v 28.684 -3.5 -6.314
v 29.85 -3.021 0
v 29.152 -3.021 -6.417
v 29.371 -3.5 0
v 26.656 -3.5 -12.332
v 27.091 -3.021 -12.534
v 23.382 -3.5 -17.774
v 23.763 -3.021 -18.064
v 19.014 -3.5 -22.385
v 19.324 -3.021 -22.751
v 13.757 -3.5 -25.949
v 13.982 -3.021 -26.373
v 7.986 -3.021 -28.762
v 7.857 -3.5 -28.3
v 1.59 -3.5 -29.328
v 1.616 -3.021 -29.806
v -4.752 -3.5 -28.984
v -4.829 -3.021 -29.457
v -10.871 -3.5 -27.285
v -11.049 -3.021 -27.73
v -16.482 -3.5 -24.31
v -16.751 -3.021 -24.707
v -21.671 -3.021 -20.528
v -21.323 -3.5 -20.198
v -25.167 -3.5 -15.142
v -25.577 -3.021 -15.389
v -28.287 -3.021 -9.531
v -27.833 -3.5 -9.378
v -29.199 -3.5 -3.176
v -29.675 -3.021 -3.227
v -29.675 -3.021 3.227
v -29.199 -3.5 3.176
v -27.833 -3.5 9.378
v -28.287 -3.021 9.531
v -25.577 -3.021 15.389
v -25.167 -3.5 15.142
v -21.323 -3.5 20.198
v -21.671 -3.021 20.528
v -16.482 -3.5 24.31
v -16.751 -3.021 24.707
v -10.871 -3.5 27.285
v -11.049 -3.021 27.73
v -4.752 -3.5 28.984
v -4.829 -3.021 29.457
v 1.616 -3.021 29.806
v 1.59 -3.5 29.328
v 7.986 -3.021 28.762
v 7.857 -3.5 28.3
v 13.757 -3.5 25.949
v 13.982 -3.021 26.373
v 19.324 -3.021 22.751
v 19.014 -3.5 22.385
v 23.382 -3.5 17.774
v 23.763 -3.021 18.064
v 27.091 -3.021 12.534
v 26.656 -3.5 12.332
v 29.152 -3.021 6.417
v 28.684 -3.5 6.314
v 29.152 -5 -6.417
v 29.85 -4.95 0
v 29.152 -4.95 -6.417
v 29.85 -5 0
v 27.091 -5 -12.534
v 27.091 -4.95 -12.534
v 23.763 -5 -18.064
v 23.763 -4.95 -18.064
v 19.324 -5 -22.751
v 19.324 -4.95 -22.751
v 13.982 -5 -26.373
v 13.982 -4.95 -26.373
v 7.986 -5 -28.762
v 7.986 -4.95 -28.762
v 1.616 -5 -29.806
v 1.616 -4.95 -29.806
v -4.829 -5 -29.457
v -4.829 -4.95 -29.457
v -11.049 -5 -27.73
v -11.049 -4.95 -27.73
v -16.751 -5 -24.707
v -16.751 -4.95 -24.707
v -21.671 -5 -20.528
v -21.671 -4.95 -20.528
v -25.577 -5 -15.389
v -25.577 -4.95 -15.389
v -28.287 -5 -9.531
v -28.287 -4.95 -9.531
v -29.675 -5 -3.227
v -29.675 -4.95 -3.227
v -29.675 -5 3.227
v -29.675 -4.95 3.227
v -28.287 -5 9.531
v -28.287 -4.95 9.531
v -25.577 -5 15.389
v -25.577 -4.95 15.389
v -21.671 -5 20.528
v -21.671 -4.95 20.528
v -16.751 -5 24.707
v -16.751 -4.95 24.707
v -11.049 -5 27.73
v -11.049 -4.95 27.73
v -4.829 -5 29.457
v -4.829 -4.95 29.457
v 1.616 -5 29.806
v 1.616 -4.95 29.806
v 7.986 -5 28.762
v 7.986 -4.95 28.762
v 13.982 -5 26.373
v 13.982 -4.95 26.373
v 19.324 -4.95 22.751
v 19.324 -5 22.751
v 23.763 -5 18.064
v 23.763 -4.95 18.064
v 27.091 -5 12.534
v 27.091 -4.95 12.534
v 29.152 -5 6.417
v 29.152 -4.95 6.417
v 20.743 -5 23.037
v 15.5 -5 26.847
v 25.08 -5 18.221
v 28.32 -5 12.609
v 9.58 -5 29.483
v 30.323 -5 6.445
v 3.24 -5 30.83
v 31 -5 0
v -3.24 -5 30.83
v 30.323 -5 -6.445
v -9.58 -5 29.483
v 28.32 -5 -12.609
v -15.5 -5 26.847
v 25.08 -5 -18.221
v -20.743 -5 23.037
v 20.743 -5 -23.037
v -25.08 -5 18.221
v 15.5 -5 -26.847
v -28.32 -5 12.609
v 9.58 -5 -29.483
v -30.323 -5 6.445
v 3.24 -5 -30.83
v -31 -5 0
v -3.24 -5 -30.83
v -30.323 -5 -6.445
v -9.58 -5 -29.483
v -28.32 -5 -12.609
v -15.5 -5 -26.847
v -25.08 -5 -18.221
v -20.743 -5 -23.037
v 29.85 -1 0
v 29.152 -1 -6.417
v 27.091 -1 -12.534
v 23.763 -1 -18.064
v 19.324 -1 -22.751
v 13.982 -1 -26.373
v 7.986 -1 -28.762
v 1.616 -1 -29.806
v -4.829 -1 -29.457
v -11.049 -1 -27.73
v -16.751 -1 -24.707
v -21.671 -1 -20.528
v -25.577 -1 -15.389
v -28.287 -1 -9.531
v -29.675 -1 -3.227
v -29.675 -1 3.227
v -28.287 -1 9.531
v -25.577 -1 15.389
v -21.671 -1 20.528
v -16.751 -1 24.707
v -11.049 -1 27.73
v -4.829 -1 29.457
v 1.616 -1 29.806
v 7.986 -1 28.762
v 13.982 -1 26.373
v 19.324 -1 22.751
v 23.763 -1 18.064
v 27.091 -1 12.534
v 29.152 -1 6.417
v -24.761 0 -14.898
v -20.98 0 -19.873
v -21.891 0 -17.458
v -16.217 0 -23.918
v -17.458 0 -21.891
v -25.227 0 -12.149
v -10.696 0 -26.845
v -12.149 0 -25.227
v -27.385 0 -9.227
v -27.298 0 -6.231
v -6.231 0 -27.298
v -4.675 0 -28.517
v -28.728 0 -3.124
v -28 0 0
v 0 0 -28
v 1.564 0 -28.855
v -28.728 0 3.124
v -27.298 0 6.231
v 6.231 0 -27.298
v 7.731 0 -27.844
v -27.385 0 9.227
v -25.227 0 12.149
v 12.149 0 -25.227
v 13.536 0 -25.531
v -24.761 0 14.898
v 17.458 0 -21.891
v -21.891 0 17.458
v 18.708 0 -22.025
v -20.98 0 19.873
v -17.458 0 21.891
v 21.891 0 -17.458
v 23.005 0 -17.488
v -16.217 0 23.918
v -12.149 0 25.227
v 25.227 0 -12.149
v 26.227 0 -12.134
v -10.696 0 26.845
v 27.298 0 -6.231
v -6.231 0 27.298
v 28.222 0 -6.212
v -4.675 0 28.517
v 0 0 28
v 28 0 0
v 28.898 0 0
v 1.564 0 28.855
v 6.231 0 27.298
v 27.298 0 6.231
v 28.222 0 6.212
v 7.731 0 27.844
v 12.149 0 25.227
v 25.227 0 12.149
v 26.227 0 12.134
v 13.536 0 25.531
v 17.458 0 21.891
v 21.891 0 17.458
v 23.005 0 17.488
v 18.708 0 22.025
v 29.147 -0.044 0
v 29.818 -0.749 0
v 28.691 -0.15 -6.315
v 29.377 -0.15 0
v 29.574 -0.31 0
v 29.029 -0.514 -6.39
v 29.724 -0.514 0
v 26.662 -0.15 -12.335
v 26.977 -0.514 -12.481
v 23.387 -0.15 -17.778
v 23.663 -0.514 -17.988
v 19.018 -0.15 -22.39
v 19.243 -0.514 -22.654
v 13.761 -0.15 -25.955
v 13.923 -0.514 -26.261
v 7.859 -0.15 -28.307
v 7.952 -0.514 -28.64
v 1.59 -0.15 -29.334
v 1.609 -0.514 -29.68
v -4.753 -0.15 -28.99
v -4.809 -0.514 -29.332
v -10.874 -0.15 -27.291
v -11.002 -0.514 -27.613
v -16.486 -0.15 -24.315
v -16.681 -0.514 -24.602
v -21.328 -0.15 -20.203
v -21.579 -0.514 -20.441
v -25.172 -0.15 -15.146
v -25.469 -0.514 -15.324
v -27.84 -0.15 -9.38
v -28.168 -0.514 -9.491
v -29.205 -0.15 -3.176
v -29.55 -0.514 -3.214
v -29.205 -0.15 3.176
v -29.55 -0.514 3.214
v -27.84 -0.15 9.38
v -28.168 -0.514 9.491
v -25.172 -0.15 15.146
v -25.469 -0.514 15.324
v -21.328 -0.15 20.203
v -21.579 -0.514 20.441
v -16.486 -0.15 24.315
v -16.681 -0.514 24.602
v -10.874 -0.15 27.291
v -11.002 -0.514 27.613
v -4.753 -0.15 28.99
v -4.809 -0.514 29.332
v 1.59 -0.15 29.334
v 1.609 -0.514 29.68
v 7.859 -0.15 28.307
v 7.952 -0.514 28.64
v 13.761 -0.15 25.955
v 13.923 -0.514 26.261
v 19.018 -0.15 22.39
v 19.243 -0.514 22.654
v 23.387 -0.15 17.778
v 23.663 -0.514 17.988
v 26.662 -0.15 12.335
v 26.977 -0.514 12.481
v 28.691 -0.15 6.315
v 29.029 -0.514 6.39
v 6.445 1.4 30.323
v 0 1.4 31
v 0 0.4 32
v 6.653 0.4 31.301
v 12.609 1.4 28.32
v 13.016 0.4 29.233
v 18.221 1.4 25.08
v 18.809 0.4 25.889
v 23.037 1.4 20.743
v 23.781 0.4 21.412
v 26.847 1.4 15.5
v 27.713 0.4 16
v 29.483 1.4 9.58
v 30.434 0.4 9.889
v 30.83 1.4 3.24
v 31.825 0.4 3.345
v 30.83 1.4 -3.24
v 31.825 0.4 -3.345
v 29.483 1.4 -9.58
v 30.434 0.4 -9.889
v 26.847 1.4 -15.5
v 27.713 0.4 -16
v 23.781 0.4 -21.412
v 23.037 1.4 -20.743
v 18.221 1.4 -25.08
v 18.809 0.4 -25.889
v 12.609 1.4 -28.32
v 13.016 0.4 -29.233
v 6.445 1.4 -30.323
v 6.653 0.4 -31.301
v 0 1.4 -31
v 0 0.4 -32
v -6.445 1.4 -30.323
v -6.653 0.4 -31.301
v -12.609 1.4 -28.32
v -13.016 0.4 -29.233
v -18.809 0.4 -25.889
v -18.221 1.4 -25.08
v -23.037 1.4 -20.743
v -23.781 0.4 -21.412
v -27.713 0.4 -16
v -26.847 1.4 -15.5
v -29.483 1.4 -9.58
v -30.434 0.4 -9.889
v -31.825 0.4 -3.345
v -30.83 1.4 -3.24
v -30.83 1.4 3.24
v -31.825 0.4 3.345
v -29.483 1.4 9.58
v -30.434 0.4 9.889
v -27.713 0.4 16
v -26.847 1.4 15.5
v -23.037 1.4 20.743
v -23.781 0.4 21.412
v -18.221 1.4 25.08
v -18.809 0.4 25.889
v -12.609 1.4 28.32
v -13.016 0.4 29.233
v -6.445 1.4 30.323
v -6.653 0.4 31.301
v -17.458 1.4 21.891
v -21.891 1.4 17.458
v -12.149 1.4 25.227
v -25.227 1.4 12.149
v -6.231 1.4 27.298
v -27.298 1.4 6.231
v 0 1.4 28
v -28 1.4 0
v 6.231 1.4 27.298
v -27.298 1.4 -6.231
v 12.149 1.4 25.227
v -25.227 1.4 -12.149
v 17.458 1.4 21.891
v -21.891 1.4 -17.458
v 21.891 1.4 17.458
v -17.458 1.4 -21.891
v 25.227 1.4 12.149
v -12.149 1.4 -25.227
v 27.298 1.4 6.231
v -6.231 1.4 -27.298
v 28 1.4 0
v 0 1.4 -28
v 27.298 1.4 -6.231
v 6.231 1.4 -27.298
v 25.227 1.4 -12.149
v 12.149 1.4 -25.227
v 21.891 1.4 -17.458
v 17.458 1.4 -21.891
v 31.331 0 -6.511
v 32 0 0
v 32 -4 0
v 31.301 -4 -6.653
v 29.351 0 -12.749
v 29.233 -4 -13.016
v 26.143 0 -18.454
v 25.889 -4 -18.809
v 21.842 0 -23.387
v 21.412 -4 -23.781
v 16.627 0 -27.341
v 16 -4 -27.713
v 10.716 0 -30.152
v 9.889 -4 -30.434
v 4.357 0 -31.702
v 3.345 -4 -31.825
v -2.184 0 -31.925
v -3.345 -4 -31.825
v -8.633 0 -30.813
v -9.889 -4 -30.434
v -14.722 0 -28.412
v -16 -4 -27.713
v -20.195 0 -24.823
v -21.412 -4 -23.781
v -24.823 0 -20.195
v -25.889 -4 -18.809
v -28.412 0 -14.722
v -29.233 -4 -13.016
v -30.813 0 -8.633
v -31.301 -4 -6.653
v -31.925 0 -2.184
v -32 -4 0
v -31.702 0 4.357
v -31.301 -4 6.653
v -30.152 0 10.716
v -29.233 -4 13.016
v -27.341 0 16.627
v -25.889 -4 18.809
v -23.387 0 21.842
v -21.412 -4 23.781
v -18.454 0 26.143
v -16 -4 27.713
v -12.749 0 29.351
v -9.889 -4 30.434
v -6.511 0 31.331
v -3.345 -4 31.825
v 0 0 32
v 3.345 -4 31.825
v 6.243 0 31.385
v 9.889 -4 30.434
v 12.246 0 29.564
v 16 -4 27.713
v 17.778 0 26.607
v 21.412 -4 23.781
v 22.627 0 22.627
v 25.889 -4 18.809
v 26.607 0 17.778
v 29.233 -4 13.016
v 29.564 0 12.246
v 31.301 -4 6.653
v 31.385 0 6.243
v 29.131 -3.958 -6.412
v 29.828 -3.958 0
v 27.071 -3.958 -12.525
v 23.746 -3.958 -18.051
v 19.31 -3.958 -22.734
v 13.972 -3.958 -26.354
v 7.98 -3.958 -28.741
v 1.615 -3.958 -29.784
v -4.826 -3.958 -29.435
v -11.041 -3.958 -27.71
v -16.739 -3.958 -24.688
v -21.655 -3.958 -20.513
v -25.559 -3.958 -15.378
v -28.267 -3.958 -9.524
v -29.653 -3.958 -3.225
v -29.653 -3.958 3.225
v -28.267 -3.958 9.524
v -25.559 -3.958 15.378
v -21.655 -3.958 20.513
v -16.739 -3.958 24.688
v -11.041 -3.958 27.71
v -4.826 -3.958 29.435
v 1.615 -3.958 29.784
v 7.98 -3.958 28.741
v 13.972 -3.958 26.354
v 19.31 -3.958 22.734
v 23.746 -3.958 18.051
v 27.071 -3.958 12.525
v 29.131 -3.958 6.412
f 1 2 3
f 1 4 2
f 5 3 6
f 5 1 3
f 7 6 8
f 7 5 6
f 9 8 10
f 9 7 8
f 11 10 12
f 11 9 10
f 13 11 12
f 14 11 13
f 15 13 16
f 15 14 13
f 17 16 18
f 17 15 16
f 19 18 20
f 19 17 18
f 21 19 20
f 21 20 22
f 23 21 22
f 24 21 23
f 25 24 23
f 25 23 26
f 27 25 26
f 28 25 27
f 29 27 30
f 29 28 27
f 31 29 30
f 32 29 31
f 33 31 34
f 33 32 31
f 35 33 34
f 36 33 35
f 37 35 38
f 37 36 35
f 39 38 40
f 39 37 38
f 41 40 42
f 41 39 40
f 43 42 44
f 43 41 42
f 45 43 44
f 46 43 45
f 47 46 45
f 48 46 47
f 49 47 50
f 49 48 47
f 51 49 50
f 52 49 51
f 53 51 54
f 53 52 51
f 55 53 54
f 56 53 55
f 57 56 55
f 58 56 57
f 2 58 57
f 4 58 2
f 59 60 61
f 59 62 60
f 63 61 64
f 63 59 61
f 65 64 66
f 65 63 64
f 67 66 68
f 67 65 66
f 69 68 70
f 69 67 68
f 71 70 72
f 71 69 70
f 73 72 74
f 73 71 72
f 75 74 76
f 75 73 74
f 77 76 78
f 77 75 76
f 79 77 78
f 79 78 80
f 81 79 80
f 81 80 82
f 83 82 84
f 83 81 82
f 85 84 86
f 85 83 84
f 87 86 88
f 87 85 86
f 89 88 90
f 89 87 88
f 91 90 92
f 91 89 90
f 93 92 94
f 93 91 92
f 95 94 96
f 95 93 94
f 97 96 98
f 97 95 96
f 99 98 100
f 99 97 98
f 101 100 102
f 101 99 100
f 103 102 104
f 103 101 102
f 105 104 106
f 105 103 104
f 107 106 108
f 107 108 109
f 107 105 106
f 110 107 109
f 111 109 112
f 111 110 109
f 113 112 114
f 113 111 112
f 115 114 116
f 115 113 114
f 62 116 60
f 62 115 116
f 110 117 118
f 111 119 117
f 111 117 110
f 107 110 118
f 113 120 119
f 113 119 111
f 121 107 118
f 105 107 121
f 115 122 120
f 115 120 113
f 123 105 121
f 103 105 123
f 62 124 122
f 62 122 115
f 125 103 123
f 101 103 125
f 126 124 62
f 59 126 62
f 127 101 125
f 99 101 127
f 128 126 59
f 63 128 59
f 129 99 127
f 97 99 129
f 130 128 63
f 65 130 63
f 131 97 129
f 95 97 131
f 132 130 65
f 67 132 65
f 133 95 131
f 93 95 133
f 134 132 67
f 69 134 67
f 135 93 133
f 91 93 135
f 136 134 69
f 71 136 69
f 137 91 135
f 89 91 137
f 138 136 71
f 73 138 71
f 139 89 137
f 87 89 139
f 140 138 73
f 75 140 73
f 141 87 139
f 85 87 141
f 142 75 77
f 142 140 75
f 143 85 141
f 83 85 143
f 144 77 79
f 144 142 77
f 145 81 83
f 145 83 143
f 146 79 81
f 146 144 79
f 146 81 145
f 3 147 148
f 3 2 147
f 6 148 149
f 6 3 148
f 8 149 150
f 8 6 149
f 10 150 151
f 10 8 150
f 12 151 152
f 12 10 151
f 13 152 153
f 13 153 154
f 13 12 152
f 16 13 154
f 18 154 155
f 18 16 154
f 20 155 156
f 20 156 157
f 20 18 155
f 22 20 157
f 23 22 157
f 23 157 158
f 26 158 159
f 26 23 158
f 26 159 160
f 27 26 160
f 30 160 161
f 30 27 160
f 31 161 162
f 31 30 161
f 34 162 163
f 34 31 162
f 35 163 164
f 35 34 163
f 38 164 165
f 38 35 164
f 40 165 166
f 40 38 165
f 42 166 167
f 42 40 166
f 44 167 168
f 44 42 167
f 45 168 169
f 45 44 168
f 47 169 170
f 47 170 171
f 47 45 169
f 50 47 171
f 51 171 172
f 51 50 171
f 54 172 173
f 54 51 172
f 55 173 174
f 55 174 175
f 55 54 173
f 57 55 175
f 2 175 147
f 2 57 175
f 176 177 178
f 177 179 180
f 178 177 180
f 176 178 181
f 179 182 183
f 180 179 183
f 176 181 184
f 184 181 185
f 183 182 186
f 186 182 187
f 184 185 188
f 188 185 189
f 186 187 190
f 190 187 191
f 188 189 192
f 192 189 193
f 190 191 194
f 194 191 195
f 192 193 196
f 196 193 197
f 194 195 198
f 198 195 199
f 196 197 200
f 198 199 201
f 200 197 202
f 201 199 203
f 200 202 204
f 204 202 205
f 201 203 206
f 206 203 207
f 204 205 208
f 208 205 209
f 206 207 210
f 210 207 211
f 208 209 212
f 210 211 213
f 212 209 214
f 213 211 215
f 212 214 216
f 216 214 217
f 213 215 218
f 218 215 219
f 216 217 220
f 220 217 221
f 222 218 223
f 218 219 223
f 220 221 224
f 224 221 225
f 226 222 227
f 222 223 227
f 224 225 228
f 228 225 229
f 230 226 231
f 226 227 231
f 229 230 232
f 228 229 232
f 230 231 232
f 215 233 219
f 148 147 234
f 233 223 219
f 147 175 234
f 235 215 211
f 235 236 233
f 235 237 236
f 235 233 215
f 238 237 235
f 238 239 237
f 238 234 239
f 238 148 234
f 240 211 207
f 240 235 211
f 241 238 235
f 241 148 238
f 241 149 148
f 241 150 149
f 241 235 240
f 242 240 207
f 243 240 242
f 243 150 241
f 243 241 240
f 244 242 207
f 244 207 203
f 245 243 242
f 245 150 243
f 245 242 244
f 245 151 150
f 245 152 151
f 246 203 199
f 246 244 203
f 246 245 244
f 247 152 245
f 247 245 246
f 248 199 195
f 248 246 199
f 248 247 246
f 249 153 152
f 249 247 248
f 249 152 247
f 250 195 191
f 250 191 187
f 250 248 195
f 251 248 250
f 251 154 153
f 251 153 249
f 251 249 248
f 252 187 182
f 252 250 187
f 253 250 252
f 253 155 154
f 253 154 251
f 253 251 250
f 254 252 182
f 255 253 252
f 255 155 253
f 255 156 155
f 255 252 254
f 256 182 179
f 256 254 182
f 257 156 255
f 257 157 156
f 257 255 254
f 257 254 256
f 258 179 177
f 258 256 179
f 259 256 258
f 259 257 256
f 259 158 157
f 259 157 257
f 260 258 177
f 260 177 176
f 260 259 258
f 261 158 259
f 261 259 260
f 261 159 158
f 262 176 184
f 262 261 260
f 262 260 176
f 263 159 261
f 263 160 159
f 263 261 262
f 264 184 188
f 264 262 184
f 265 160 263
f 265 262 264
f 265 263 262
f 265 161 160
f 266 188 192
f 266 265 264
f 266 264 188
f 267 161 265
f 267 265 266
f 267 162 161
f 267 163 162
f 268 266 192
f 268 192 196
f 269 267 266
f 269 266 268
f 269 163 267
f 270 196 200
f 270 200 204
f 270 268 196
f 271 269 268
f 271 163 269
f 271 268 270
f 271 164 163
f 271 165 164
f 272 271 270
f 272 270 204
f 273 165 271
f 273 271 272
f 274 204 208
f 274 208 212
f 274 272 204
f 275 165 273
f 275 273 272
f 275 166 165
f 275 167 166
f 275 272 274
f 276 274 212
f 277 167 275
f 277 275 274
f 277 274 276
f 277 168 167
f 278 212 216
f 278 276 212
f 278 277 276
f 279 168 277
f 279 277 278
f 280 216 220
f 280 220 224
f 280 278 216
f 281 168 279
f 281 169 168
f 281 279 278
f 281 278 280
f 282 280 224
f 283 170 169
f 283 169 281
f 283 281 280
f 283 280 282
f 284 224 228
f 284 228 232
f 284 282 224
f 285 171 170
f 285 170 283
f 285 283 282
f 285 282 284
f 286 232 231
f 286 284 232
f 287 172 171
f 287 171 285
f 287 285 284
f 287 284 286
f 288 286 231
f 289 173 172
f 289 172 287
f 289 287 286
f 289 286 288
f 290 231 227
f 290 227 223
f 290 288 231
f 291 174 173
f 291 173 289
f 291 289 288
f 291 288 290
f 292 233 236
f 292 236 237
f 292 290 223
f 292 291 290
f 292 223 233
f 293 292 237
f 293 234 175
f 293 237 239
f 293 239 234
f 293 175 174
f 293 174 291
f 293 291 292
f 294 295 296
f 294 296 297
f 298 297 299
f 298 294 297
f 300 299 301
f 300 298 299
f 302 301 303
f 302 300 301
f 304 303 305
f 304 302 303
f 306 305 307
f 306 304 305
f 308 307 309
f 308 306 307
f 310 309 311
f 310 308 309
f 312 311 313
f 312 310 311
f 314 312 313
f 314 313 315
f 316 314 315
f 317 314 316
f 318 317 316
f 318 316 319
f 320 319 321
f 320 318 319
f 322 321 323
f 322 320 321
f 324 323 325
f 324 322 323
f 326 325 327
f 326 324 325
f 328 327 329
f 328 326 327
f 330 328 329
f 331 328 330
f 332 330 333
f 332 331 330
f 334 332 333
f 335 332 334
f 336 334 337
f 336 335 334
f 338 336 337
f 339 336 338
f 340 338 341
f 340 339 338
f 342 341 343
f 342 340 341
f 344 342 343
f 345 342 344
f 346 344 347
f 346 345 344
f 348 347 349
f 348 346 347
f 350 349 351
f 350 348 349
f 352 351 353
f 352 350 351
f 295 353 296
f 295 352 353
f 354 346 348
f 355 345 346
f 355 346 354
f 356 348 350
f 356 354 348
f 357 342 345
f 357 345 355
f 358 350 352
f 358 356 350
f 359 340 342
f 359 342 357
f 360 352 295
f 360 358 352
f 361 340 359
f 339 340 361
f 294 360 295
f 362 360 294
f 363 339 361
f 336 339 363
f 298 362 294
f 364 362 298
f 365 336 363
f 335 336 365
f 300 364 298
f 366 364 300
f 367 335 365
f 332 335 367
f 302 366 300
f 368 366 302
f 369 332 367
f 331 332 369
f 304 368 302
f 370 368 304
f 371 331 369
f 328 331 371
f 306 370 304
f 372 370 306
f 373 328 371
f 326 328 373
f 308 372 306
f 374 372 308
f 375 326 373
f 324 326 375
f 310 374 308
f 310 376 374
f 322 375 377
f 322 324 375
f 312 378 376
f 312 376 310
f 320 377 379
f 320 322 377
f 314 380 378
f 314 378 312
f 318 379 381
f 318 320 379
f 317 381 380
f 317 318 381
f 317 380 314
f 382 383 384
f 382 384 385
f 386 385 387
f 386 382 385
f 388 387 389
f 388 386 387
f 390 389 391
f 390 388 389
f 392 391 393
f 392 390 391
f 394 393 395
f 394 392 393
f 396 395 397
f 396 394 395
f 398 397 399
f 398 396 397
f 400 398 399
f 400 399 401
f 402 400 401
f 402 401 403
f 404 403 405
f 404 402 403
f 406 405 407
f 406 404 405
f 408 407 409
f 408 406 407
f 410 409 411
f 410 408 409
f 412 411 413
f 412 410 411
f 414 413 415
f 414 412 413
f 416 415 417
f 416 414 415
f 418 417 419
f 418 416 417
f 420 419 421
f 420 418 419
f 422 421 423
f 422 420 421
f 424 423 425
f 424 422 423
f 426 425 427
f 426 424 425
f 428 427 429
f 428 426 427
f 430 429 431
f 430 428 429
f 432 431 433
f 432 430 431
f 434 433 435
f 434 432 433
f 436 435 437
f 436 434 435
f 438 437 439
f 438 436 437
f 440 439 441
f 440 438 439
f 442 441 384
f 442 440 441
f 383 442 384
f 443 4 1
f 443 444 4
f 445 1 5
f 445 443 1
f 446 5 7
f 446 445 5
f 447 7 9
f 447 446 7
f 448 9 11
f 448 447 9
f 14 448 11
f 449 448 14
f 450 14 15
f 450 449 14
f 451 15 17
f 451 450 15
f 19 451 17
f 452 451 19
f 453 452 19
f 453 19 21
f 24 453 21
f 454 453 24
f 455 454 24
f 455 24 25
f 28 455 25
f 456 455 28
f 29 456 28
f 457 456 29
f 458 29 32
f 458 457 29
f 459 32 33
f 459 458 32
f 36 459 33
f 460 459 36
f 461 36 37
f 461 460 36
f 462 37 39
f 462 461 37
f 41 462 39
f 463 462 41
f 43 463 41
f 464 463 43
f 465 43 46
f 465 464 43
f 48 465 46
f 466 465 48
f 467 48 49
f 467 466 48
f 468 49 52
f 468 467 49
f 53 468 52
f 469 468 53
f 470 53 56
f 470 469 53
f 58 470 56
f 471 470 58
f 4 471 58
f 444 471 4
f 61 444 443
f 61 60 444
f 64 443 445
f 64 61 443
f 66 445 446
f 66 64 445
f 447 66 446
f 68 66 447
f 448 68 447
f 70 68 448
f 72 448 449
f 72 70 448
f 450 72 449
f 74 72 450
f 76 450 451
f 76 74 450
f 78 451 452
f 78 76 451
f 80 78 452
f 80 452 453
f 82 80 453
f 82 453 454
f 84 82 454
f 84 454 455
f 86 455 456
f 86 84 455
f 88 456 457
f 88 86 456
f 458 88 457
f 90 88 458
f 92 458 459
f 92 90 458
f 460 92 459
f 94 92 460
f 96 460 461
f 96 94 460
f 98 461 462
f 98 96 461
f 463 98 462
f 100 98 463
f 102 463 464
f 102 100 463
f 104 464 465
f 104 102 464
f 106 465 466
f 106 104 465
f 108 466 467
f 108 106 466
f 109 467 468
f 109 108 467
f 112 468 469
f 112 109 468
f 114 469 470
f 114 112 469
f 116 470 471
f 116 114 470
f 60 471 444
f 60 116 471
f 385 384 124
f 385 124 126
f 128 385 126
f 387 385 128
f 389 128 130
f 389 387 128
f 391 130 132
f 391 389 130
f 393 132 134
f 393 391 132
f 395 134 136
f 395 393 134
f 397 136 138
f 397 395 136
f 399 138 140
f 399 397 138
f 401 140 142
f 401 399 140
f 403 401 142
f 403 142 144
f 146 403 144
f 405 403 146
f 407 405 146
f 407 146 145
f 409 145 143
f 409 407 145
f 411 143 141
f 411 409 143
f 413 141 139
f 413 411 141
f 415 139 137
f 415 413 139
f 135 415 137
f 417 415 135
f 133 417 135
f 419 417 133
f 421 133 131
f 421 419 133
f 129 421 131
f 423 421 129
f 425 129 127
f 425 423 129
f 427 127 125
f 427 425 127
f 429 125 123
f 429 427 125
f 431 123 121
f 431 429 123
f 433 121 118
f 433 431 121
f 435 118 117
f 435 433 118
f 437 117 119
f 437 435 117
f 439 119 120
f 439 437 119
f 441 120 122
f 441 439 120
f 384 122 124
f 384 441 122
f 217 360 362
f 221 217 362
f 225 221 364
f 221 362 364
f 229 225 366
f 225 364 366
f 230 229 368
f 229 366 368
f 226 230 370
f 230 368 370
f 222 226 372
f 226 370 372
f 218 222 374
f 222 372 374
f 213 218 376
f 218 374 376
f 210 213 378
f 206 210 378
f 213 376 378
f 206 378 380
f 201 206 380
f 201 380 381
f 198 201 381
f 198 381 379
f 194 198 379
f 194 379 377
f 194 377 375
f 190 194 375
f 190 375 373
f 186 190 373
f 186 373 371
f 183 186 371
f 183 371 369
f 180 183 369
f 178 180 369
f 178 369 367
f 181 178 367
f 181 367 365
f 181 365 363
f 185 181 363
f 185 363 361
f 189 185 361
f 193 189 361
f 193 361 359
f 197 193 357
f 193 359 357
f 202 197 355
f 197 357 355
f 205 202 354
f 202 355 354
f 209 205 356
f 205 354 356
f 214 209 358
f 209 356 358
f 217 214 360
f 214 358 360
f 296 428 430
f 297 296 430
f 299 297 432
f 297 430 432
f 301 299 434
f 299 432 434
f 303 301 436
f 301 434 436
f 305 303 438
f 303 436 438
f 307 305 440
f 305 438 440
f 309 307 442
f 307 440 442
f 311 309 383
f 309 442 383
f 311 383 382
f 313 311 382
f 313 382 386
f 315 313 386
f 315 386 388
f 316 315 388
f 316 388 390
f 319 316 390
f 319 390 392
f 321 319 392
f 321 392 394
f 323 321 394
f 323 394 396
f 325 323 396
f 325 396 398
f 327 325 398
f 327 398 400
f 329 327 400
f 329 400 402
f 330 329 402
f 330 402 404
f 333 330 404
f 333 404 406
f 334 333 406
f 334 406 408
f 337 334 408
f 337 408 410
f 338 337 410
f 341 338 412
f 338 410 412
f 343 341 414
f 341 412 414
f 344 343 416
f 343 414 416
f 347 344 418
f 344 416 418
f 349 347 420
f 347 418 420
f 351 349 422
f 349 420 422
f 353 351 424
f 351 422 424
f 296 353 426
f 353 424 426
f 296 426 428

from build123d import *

# Parameters (mm, degrees)
SKETCH_1_R          = 32
EXTRUDE_1_DEPTH     = 2.4
SKETCH_3_R          = 28
CUT_EXTRUDE_1_DEPTH = 10
SKETCH_4_R          = 32
CUT_EXTRUDE_2_DEPTH = 1
CHAMFER_1_SIZE      = 1
CHAMFER_2_SIZE      = 1


with BuildPart() as part:
    # 草图1 → 凸台-拉伸1 (new body)
    with BuildSketch(Plane(origin=(0, 0, 0), x_dir=(1, 0, 0), z_dir=(0, 1, 0))):
        Circle(SKETCH_1_R)
    extrude(amount=EXTRUDE_1_DEPTH)

    # 草图2 → 旋转1 (revolve)
    with BuildSketch(Plane.XY):
        with BuildLine():
            Line((32, 0), (28.897619048, 0))
            ThreePointArc((28.897619048, 0), (29.573809524, -0.30952381), (29.85, -1))
            Line((29.85, -1), (29.85, -3.020710678))
            Line((29.85, -3.020710678), (29.370710678, -3.5))
            Line((29.370710678, -3.5), (29.828219647, -3.957508969))
            Line((29.828219647, -3.957508969), (29.85, -4.95))
            Line((29.85, -4.95), (29.85, -5))
            Line((29.85, -5), (31, -5))
            Line((31, -5), (32, -5))
            Line((32, -5), (32, 0))
        make_face()
    revolve(axis=Axis((0, -25, 0), (0, 1, 0)))

    # 草图3 → 切除-拉伸1 (cut)
    with BuildSketch(Plane(origin=(0, 2.4, 0), x_dir=(1, 0, 0), z_dir=(0, 1, 0))):
        Circle(SKETCH_3_R)
    extrude(amount=-CUT_EXTRUDE_1_DEPTH, mode=Mode.SUBTRACT)

    # 草图4 → 切除-拉伸2 (cut)
    with BuildSketch(Plane(origin=(0, 2.4, 0), x_dir=(1, 0, 0), z_dir=(0, 1, 0))):
        Circle(SKETCH_4_R)
    extrude(amount=-CUT_EXTRUDE_2_DEPTH, mode=Mode.SUBTRACT)

    # 倒角1
    chamfer_1_edges = [part.edges().sort_by_distance(p)[0] for p in [
        (-32, -5, 0),
    ]]
    chamfer(chamfer_1_edges, length=CHAMFER_1_SIZE)

    # 倒角2
    chamfer_2_edges = [part.edges().sort_by_distance(p)[0] for p in [
        (-32, 1.4, 0),
    ]]
    chamfer(chamfer_2_edges, length=CHAMFER_2_SIZE)


solid = part.part
